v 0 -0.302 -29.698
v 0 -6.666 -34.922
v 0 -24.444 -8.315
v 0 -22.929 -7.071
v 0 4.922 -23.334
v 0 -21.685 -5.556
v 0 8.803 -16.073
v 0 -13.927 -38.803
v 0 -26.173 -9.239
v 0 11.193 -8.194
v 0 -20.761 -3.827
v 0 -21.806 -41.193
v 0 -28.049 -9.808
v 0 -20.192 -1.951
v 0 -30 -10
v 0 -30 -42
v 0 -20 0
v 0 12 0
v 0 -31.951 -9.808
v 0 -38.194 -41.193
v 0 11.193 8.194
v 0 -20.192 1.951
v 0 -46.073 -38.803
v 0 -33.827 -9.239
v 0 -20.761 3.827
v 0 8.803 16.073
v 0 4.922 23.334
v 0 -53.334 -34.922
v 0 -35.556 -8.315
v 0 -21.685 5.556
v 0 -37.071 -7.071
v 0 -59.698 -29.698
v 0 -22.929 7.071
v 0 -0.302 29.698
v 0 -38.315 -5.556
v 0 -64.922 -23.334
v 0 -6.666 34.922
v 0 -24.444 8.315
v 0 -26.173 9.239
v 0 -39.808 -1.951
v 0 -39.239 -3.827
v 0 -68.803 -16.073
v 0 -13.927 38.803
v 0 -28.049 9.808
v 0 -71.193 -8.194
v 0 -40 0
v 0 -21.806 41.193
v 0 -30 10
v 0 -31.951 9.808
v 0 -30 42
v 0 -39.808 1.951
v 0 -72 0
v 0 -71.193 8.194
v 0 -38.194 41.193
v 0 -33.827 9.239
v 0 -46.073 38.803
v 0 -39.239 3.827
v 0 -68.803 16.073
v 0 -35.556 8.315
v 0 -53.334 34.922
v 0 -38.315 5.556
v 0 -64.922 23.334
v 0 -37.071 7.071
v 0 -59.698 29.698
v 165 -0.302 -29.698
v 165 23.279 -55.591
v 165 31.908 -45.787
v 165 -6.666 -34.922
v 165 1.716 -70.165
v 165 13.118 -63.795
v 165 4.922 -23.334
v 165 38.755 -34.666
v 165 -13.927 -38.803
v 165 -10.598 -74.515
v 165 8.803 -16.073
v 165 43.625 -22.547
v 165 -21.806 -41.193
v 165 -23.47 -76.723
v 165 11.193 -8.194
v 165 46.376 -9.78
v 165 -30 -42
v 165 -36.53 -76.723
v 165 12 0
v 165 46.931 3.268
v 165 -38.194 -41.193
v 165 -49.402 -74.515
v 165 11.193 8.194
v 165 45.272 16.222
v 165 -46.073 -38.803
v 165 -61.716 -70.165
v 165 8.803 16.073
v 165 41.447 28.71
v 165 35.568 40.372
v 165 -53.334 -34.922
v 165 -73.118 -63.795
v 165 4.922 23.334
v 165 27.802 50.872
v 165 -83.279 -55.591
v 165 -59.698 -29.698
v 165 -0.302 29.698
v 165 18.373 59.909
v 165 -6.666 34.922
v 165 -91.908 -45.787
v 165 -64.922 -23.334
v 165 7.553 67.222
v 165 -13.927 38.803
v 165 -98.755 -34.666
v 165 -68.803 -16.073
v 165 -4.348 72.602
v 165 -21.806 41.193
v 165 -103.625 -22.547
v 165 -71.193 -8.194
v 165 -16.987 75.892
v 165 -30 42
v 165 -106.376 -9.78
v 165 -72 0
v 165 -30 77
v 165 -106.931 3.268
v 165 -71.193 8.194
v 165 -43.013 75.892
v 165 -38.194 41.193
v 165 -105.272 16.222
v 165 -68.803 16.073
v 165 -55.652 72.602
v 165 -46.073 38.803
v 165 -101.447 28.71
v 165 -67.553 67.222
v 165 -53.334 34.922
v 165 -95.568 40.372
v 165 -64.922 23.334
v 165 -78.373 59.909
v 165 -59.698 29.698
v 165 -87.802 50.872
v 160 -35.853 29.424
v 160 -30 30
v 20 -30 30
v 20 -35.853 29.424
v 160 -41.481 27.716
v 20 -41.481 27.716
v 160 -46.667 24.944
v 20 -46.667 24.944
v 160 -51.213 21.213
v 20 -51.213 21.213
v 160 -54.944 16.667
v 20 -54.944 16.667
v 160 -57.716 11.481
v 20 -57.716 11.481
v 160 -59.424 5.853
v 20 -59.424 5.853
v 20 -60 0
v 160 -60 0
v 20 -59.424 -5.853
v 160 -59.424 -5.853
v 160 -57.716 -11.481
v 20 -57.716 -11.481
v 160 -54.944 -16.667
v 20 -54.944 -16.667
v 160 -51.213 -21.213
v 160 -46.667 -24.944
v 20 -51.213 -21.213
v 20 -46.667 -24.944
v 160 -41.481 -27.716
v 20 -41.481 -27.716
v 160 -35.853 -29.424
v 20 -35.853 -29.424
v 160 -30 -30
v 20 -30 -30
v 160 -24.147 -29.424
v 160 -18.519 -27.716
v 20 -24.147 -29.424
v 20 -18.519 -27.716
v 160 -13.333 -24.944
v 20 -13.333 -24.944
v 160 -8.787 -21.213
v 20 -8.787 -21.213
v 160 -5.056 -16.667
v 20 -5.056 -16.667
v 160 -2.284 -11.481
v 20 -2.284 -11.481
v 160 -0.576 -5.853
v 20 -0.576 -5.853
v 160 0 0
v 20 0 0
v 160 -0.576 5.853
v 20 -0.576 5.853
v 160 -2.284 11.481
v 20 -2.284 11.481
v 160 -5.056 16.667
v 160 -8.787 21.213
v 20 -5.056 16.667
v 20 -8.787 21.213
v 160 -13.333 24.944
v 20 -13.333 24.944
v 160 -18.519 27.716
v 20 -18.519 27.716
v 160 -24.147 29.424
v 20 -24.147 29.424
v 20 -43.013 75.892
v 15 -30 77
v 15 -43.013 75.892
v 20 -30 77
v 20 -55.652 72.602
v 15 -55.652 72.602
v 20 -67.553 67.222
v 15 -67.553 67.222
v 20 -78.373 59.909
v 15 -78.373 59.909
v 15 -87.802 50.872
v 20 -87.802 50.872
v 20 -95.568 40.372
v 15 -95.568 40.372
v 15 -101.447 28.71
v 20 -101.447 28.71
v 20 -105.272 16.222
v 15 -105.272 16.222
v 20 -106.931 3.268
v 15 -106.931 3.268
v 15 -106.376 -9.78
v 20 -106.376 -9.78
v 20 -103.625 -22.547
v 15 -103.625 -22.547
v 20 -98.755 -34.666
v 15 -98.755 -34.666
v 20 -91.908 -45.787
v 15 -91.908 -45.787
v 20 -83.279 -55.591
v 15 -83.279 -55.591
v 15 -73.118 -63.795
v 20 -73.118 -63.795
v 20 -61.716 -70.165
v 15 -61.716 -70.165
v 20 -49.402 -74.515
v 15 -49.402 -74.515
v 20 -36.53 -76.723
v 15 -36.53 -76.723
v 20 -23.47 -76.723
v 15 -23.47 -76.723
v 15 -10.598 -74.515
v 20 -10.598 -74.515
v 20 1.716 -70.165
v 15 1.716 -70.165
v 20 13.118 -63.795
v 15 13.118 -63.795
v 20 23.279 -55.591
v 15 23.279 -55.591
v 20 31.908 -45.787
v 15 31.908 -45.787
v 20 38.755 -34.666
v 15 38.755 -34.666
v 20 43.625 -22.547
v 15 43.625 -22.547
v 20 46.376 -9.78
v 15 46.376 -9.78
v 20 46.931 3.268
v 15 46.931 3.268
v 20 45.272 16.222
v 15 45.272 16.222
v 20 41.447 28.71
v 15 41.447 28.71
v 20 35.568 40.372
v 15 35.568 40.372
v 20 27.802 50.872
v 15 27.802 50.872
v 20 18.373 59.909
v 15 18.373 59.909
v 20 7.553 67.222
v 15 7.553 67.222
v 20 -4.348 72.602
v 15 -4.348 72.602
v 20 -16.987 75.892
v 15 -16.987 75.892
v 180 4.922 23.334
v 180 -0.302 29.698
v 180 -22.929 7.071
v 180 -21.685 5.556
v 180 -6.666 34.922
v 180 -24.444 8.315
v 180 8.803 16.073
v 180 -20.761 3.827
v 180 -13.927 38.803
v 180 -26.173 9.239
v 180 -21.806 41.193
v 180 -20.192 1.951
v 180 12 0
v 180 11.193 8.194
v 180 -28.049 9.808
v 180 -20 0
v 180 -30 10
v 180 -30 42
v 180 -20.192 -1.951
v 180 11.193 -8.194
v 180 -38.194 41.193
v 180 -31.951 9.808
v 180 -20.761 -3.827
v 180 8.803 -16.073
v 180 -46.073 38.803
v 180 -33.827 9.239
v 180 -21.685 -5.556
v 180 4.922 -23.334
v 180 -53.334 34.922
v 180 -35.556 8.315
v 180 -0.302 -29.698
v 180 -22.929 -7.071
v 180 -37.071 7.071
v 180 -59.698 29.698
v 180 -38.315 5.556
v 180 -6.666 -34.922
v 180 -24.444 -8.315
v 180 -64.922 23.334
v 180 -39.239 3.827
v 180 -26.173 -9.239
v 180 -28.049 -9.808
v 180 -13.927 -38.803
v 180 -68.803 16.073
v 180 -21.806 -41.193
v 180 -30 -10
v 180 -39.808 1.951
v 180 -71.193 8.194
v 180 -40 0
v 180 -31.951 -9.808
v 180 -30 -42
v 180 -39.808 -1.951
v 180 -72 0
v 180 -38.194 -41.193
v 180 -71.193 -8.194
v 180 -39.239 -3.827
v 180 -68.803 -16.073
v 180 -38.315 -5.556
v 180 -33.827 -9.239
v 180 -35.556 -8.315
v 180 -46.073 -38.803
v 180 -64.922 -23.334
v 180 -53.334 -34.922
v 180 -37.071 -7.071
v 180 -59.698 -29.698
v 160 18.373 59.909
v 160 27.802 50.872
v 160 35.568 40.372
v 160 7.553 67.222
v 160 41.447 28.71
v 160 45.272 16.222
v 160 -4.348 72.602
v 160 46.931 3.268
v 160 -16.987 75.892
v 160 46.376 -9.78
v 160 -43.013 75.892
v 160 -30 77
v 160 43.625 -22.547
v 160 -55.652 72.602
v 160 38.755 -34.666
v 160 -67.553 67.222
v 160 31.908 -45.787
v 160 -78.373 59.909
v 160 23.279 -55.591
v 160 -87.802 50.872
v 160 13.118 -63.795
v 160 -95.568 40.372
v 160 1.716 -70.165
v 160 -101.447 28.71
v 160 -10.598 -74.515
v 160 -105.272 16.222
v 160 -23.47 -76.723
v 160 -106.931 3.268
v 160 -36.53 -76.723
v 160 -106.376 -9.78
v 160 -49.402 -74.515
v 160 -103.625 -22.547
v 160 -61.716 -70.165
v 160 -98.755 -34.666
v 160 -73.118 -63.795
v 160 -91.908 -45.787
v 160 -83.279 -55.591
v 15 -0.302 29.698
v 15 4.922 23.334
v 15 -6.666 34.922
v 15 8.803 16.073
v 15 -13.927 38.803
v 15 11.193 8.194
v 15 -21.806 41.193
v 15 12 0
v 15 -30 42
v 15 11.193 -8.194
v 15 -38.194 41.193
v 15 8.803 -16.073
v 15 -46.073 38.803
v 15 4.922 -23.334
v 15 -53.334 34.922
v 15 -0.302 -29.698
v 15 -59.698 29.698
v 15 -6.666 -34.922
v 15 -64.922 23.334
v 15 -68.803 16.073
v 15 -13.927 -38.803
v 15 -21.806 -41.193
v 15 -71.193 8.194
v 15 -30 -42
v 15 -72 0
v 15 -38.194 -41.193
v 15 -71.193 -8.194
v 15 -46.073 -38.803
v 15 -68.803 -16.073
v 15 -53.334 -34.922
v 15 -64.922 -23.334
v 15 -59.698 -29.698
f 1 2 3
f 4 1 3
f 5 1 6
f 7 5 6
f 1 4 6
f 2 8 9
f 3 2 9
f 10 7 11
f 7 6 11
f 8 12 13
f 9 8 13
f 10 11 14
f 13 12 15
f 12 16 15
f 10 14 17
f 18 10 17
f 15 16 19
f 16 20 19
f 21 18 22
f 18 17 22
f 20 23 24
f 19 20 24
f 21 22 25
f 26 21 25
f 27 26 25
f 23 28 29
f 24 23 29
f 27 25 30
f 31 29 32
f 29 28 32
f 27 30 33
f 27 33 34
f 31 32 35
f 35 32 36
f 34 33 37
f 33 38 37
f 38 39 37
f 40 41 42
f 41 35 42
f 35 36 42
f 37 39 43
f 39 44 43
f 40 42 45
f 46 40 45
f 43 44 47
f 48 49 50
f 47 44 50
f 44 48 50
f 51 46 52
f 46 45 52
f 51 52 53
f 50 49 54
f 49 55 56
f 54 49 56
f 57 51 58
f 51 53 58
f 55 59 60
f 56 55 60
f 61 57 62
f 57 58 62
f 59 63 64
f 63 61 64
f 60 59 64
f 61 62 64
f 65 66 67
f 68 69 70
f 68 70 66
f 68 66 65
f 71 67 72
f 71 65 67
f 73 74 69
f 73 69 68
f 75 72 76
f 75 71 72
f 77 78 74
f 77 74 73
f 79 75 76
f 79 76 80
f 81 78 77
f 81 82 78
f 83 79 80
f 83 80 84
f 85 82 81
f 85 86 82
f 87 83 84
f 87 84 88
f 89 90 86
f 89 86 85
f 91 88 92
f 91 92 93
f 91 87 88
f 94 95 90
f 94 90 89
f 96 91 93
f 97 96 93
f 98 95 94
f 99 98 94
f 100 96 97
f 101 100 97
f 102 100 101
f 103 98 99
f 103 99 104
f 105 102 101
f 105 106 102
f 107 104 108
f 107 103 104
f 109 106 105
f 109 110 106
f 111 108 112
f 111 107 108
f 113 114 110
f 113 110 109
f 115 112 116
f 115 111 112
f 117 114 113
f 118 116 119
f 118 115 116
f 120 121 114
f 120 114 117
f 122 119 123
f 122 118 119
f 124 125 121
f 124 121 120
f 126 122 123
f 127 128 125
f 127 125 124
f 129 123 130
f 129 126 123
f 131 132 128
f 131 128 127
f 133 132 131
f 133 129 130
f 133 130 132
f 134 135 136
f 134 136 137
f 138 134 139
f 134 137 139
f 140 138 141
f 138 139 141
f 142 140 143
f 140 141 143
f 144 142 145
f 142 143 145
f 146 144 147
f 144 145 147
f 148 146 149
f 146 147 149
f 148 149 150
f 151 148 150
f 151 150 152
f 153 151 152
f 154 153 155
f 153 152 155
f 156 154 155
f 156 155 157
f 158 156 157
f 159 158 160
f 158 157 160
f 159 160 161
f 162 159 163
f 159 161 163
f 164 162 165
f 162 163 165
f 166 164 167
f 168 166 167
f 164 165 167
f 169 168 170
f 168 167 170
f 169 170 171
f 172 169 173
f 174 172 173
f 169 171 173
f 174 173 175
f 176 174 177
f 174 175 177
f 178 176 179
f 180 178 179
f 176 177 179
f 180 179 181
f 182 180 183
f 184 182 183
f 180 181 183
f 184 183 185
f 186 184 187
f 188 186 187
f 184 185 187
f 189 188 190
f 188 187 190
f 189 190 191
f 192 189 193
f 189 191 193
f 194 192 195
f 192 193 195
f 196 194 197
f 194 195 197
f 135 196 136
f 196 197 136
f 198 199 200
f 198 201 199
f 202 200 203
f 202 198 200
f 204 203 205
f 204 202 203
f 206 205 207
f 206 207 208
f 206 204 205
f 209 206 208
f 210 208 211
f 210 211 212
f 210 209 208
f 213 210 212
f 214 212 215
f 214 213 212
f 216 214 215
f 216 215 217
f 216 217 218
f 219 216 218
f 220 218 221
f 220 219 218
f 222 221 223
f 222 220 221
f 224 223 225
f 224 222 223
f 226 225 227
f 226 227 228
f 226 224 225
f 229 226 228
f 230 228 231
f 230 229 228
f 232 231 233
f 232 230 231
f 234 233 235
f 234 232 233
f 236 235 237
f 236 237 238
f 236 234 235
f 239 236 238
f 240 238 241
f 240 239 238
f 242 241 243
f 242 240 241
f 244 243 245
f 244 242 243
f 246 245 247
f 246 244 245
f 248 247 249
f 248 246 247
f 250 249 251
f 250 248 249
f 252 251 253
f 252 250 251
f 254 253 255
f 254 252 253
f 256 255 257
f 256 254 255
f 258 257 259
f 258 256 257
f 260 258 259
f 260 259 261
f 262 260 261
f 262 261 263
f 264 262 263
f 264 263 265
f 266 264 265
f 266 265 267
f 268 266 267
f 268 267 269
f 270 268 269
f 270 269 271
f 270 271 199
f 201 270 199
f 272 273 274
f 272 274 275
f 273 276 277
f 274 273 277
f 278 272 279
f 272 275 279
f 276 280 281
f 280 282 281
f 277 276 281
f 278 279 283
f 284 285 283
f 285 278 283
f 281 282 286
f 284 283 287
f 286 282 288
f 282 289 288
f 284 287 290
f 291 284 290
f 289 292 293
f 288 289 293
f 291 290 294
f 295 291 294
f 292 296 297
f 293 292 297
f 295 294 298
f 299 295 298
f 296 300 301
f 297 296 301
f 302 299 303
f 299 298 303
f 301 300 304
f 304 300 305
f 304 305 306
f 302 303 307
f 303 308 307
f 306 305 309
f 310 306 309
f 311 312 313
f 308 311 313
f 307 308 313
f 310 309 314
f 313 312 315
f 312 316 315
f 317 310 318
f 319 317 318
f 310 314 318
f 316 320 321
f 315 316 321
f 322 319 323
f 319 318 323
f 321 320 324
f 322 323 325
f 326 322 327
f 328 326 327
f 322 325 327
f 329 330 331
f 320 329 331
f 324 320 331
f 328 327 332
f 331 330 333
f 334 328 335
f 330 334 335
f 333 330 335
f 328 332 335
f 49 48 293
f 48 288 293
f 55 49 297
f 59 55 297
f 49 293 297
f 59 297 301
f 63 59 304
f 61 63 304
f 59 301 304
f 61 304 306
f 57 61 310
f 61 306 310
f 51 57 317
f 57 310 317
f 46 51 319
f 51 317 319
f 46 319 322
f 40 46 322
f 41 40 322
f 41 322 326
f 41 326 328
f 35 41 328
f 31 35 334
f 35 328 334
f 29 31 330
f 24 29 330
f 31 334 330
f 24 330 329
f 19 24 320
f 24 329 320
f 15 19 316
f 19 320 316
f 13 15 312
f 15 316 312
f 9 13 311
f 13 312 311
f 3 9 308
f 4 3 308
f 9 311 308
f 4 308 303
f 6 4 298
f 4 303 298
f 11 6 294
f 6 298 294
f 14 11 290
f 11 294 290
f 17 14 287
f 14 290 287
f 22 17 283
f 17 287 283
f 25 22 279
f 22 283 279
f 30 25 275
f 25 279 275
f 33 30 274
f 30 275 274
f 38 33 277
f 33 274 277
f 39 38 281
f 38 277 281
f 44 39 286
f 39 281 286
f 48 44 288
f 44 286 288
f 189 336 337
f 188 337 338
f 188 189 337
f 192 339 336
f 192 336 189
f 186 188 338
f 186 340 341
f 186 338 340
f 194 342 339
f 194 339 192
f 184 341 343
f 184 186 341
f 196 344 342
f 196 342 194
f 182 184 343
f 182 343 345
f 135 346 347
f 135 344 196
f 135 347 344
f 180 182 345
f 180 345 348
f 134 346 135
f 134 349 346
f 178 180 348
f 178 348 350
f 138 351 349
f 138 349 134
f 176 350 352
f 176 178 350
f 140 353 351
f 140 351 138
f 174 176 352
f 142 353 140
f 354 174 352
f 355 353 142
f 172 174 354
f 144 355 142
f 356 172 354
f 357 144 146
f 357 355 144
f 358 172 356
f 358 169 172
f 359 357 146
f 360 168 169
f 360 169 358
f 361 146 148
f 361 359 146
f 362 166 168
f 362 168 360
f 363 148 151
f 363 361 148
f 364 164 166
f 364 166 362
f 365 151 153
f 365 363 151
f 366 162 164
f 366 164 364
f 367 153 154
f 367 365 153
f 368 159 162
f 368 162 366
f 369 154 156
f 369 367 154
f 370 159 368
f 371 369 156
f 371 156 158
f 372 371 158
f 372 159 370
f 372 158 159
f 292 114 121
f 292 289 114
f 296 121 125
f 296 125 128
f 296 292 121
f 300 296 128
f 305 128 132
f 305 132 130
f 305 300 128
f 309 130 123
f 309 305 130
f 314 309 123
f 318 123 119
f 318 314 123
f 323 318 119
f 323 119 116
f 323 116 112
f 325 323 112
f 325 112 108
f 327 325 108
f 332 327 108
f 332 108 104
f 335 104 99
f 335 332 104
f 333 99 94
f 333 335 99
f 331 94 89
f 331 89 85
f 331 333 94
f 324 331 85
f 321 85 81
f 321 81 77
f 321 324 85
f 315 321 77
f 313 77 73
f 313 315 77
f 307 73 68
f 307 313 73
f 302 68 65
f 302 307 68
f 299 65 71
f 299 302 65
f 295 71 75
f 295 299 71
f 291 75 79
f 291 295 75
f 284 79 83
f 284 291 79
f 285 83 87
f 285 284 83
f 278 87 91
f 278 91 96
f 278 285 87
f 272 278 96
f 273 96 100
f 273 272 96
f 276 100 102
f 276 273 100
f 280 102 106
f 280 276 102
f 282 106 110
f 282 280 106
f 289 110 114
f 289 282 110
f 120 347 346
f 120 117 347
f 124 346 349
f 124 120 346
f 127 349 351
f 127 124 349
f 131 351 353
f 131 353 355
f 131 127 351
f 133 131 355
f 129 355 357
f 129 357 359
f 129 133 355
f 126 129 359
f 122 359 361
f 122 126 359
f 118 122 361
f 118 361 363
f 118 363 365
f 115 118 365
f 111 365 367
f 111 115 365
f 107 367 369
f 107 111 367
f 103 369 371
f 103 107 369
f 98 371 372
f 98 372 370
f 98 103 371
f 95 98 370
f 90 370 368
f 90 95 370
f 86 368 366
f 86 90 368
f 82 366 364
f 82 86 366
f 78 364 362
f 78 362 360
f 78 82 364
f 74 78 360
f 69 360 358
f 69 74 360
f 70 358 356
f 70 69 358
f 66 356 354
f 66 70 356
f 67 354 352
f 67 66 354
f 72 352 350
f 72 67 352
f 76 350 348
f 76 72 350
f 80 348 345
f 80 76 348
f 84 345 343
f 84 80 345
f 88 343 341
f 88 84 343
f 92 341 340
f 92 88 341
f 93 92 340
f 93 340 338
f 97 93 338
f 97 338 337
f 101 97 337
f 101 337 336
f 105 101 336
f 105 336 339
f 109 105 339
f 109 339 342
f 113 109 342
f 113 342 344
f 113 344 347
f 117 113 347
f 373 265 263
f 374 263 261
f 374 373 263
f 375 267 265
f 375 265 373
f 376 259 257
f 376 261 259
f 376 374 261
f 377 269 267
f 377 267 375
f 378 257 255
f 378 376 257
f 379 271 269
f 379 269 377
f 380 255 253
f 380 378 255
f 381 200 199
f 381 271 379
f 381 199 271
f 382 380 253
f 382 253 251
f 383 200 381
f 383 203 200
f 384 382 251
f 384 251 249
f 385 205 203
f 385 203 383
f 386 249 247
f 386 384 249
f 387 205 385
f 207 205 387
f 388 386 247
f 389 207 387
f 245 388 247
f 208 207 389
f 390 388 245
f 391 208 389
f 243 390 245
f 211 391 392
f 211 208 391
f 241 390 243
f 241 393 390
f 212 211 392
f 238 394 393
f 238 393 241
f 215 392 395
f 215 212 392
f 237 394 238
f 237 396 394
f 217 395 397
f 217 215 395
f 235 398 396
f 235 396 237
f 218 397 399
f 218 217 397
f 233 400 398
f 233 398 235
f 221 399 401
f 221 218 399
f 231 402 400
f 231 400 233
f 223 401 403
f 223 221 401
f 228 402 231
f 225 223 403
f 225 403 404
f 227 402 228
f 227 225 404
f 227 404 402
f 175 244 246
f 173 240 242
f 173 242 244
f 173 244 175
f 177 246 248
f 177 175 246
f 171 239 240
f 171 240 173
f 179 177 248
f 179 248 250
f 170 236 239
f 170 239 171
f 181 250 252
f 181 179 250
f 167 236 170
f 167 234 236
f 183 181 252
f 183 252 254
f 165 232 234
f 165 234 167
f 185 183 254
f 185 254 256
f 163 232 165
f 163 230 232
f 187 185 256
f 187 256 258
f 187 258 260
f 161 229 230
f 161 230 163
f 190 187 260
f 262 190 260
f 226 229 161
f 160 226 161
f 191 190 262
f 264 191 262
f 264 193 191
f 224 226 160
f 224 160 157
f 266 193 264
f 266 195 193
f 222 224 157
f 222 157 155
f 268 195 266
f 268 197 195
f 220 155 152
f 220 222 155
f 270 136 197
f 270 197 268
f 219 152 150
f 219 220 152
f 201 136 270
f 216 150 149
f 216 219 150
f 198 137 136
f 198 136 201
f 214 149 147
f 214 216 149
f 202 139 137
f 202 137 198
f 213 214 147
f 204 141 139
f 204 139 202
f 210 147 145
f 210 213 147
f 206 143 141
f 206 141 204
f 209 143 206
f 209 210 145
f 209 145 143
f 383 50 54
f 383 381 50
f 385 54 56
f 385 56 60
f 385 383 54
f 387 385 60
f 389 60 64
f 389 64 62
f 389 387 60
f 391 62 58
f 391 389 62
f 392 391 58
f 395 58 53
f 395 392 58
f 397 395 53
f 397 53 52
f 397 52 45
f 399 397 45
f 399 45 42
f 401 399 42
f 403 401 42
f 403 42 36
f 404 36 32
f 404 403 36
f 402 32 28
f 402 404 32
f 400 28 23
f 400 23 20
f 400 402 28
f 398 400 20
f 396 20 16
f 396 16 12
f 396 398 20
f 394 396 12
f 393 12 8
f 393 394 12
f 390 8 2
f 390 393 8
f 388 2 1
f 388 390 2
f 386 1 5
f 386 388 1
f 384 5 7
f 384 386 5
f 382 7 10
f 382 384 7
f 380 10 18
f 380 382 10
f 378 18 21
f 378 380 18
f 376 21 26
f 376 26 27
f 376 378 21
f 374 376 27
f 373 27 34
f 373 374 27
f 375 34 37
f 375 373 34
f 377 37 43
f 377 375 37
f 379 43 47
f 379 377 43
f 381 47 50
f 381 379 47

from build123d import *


with BuildPart() as part:
    # Esquisse1 → Révolution1 (revolve)
    with BuildSketch(Plane.XY, mode=Mode.PRIVATE) as r_volution1_sk:
        Polygon((180, 0), (160, 0), (160, 47), (165, 47), (165, 12), (180, 12), align=None)
        Polygon((20, 0), (0, 0), (0, -20), (180, -20), (180, 0), (160, 0), align=None)
        Polygon((20, 0), (0, 0), (0, 12), (15, 12), (15, 47), (20, 47), align=None)
    revolve(r_volution1_sk.sketch.rotate(Axis((0, -30, 0), (1, 0, 0)), 90), axis=Axis((0, -30, 0), (1, 0, 0)))


solid = part.part
